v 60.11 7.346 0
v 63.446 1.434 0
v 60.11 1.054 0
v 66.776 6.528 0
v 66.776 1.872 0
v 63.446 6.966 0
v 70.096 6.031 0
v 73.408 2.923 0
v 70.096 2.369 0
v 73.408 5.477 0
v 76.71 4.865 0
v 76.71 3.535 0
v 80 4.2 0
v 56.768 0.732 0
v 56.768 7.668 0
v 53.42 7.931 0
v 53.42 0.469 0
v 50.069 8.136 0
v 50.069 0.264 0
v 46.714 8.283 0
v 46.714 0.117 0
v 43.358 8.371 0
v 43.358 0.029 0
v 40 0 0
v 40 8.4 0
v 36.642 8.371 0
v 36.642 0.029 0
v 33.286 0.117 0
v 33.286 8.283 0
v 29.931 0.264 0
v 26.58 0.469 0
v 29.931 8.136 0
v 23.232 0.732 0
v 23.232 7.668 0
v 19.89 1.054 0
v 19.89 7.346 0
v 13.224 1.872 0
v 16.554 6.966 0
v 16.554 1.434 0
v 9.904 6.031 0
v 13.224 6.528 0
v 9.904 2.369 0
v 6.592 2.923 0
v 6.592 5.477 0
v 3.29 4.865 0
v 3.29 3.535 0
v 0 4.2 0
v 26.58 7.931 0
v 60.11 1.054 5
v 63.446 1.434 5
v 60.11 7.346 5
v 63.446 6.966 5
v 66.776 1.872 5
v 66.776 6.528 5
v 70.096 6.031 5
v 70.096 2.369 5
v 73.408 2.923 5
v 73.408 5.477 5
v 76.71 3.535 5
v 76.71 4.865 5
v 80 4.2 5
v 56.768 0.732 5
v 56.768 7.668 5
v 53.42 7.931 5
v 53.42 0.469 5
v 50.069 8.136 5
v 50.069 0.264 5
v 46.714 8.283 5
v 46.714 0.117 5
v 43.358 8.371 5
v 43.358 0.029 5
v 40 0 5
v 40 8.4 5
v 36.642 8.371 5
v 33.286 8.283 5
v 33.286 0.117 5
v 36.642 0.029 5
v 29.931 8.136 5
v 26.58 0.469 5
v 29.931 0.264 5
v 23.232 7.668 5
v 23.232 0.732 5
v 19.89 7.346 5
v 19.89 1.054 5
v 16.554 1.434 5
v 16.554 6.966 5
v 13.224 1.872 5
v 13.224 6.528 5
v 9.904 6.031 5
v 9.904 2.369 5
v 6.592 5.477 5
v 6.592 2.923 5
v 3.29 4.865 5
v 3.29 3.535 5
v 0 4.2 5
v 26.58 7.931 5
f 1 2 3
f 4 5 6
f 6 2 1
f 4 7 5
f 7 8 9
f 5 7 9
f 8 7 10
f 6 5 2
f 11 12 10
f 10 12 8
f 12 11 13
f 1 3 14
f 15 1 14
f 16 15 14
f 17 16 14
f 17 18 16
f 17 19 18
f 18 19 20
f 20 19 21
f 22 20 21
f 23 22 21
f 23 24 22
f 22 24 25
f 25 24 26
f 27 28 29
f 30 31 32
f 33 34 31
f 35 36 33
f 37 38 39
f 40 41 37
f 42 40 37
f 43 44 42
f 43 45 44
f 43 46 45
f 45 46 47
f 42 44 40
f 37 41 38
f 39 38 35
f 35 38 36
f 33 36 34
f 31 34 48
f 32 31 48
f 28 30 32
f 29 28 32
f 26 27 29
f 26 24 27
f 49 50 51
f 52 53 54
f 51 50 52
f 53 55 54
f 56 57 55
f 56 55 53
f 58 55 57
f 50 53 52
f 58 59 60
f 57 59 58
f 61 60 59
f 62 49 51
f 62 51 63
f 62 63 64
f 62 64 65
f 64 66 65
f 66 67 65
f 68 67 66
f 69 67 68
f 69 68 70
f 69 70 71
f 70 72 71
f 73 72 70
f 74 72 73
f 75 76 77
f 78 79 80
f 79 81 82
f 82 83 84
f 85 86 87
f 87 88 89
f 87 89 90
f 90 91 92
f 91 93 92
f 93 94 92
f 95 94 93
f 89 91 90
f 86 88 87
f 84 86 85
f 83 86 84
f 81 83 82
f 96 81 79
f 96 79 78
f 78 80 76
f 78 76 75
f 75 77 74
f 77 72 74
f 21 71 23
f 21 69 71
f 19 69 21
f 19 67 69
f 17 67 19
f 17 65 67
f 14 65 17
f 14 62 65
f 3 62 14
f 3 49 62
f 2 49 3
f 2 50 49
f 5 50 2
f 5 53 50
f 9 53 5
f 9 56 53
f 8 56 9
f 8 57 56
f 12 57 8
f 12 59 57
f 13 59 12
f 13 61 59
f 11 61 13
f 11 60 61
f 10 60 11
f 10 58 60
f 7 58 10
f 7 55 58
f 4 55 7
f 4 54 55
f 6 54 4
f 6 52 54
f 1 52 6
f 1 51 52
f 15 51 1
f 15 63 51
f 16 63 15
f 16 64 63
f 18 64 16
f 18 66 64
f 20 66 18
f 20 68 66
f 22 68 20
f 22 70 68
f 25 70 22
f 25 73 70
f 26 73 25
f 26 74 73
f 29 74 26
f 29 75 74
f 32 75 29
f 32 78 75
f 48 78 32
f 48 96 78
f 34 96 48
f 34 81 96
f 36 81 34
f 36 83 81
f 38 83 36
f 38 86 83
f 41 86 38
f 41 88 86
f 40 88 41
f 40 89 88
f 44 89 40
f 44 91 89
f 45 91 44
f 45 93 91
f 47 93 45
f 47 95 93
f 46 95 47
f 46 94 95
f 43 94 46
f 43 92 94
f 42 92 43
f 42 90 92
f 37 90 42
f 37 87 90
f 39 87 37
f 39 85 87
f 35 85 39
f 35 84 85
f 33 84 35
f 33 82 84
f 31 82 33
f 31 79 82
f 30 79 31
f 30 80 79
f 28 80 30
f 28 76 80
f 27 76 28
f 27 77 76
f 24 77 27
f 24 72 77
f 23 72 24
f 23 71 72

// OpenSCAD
$fn = 32;

// ----------------------------------------------------------------------
// Arc profile plate: lens, 48 points
// ----------------------------------------------------------------------

// --- parameters (mm) ---
lens_chord = 80;          // chord length of the lens, X
arc_r = 192.39;           // radius of both arcs
arc_angle = 24;           // angle of each arc, degrees
sagitta = 4.2;            // bulge of each arc (half the lens height)
arc_step = 1;             // sampling step of the arcs, degrees
plate_t = 5;              // plate thickness, Z

bbox_y = 2 * sagitta;  // full lens height

profile = [[80, 4.2], [76.71, 4.865], [73.408, 5.477], [70.096, 6.031], [66.776, 6.528], [63.446, 6.966], [60.11, 7.346], [56.768, 7.668], [53.42, 7.931], [50.069, 8.136], [46.714, 8.283], [43.358, 8.371], [40, 8.4], [36.642, 8.371], [33.286, 8.283], [29.931, 8.136], [26.58, 7.931], [23.232, 7.668], [19.89, 7.346], [16.554, 6.966], [13.224, 6.528], [9.904, 6.031], [6.592, 5.477], [3.29, 4.865], [0, 4.2], [3.29, 3.535], [6.592, 2.923], [9.904, 2.369], [13.224, 1.872], [16.554, 1.434], [19.89, 1.054], [23.232, 0.732], [26.58, 0.469], [29.931, 0.264], [33.286, 0.117], [36.642, 0.029], [40, 0], [43.358, 0.029], [46.714, 0.117], [50.069, 0.264], [53.42, 0.469], [56.768, 0.732], [60.11, 1.054], [63.446, 1.434], [66.776, 1.872], [70.096, 2.369], [73.408, 2.923], [76.71, 3.535]];  // primary outline, 48 points, counter clockwise

// --- the one profile operation ---
linear_extrude(height = plate_t) polygon(points = profile);
